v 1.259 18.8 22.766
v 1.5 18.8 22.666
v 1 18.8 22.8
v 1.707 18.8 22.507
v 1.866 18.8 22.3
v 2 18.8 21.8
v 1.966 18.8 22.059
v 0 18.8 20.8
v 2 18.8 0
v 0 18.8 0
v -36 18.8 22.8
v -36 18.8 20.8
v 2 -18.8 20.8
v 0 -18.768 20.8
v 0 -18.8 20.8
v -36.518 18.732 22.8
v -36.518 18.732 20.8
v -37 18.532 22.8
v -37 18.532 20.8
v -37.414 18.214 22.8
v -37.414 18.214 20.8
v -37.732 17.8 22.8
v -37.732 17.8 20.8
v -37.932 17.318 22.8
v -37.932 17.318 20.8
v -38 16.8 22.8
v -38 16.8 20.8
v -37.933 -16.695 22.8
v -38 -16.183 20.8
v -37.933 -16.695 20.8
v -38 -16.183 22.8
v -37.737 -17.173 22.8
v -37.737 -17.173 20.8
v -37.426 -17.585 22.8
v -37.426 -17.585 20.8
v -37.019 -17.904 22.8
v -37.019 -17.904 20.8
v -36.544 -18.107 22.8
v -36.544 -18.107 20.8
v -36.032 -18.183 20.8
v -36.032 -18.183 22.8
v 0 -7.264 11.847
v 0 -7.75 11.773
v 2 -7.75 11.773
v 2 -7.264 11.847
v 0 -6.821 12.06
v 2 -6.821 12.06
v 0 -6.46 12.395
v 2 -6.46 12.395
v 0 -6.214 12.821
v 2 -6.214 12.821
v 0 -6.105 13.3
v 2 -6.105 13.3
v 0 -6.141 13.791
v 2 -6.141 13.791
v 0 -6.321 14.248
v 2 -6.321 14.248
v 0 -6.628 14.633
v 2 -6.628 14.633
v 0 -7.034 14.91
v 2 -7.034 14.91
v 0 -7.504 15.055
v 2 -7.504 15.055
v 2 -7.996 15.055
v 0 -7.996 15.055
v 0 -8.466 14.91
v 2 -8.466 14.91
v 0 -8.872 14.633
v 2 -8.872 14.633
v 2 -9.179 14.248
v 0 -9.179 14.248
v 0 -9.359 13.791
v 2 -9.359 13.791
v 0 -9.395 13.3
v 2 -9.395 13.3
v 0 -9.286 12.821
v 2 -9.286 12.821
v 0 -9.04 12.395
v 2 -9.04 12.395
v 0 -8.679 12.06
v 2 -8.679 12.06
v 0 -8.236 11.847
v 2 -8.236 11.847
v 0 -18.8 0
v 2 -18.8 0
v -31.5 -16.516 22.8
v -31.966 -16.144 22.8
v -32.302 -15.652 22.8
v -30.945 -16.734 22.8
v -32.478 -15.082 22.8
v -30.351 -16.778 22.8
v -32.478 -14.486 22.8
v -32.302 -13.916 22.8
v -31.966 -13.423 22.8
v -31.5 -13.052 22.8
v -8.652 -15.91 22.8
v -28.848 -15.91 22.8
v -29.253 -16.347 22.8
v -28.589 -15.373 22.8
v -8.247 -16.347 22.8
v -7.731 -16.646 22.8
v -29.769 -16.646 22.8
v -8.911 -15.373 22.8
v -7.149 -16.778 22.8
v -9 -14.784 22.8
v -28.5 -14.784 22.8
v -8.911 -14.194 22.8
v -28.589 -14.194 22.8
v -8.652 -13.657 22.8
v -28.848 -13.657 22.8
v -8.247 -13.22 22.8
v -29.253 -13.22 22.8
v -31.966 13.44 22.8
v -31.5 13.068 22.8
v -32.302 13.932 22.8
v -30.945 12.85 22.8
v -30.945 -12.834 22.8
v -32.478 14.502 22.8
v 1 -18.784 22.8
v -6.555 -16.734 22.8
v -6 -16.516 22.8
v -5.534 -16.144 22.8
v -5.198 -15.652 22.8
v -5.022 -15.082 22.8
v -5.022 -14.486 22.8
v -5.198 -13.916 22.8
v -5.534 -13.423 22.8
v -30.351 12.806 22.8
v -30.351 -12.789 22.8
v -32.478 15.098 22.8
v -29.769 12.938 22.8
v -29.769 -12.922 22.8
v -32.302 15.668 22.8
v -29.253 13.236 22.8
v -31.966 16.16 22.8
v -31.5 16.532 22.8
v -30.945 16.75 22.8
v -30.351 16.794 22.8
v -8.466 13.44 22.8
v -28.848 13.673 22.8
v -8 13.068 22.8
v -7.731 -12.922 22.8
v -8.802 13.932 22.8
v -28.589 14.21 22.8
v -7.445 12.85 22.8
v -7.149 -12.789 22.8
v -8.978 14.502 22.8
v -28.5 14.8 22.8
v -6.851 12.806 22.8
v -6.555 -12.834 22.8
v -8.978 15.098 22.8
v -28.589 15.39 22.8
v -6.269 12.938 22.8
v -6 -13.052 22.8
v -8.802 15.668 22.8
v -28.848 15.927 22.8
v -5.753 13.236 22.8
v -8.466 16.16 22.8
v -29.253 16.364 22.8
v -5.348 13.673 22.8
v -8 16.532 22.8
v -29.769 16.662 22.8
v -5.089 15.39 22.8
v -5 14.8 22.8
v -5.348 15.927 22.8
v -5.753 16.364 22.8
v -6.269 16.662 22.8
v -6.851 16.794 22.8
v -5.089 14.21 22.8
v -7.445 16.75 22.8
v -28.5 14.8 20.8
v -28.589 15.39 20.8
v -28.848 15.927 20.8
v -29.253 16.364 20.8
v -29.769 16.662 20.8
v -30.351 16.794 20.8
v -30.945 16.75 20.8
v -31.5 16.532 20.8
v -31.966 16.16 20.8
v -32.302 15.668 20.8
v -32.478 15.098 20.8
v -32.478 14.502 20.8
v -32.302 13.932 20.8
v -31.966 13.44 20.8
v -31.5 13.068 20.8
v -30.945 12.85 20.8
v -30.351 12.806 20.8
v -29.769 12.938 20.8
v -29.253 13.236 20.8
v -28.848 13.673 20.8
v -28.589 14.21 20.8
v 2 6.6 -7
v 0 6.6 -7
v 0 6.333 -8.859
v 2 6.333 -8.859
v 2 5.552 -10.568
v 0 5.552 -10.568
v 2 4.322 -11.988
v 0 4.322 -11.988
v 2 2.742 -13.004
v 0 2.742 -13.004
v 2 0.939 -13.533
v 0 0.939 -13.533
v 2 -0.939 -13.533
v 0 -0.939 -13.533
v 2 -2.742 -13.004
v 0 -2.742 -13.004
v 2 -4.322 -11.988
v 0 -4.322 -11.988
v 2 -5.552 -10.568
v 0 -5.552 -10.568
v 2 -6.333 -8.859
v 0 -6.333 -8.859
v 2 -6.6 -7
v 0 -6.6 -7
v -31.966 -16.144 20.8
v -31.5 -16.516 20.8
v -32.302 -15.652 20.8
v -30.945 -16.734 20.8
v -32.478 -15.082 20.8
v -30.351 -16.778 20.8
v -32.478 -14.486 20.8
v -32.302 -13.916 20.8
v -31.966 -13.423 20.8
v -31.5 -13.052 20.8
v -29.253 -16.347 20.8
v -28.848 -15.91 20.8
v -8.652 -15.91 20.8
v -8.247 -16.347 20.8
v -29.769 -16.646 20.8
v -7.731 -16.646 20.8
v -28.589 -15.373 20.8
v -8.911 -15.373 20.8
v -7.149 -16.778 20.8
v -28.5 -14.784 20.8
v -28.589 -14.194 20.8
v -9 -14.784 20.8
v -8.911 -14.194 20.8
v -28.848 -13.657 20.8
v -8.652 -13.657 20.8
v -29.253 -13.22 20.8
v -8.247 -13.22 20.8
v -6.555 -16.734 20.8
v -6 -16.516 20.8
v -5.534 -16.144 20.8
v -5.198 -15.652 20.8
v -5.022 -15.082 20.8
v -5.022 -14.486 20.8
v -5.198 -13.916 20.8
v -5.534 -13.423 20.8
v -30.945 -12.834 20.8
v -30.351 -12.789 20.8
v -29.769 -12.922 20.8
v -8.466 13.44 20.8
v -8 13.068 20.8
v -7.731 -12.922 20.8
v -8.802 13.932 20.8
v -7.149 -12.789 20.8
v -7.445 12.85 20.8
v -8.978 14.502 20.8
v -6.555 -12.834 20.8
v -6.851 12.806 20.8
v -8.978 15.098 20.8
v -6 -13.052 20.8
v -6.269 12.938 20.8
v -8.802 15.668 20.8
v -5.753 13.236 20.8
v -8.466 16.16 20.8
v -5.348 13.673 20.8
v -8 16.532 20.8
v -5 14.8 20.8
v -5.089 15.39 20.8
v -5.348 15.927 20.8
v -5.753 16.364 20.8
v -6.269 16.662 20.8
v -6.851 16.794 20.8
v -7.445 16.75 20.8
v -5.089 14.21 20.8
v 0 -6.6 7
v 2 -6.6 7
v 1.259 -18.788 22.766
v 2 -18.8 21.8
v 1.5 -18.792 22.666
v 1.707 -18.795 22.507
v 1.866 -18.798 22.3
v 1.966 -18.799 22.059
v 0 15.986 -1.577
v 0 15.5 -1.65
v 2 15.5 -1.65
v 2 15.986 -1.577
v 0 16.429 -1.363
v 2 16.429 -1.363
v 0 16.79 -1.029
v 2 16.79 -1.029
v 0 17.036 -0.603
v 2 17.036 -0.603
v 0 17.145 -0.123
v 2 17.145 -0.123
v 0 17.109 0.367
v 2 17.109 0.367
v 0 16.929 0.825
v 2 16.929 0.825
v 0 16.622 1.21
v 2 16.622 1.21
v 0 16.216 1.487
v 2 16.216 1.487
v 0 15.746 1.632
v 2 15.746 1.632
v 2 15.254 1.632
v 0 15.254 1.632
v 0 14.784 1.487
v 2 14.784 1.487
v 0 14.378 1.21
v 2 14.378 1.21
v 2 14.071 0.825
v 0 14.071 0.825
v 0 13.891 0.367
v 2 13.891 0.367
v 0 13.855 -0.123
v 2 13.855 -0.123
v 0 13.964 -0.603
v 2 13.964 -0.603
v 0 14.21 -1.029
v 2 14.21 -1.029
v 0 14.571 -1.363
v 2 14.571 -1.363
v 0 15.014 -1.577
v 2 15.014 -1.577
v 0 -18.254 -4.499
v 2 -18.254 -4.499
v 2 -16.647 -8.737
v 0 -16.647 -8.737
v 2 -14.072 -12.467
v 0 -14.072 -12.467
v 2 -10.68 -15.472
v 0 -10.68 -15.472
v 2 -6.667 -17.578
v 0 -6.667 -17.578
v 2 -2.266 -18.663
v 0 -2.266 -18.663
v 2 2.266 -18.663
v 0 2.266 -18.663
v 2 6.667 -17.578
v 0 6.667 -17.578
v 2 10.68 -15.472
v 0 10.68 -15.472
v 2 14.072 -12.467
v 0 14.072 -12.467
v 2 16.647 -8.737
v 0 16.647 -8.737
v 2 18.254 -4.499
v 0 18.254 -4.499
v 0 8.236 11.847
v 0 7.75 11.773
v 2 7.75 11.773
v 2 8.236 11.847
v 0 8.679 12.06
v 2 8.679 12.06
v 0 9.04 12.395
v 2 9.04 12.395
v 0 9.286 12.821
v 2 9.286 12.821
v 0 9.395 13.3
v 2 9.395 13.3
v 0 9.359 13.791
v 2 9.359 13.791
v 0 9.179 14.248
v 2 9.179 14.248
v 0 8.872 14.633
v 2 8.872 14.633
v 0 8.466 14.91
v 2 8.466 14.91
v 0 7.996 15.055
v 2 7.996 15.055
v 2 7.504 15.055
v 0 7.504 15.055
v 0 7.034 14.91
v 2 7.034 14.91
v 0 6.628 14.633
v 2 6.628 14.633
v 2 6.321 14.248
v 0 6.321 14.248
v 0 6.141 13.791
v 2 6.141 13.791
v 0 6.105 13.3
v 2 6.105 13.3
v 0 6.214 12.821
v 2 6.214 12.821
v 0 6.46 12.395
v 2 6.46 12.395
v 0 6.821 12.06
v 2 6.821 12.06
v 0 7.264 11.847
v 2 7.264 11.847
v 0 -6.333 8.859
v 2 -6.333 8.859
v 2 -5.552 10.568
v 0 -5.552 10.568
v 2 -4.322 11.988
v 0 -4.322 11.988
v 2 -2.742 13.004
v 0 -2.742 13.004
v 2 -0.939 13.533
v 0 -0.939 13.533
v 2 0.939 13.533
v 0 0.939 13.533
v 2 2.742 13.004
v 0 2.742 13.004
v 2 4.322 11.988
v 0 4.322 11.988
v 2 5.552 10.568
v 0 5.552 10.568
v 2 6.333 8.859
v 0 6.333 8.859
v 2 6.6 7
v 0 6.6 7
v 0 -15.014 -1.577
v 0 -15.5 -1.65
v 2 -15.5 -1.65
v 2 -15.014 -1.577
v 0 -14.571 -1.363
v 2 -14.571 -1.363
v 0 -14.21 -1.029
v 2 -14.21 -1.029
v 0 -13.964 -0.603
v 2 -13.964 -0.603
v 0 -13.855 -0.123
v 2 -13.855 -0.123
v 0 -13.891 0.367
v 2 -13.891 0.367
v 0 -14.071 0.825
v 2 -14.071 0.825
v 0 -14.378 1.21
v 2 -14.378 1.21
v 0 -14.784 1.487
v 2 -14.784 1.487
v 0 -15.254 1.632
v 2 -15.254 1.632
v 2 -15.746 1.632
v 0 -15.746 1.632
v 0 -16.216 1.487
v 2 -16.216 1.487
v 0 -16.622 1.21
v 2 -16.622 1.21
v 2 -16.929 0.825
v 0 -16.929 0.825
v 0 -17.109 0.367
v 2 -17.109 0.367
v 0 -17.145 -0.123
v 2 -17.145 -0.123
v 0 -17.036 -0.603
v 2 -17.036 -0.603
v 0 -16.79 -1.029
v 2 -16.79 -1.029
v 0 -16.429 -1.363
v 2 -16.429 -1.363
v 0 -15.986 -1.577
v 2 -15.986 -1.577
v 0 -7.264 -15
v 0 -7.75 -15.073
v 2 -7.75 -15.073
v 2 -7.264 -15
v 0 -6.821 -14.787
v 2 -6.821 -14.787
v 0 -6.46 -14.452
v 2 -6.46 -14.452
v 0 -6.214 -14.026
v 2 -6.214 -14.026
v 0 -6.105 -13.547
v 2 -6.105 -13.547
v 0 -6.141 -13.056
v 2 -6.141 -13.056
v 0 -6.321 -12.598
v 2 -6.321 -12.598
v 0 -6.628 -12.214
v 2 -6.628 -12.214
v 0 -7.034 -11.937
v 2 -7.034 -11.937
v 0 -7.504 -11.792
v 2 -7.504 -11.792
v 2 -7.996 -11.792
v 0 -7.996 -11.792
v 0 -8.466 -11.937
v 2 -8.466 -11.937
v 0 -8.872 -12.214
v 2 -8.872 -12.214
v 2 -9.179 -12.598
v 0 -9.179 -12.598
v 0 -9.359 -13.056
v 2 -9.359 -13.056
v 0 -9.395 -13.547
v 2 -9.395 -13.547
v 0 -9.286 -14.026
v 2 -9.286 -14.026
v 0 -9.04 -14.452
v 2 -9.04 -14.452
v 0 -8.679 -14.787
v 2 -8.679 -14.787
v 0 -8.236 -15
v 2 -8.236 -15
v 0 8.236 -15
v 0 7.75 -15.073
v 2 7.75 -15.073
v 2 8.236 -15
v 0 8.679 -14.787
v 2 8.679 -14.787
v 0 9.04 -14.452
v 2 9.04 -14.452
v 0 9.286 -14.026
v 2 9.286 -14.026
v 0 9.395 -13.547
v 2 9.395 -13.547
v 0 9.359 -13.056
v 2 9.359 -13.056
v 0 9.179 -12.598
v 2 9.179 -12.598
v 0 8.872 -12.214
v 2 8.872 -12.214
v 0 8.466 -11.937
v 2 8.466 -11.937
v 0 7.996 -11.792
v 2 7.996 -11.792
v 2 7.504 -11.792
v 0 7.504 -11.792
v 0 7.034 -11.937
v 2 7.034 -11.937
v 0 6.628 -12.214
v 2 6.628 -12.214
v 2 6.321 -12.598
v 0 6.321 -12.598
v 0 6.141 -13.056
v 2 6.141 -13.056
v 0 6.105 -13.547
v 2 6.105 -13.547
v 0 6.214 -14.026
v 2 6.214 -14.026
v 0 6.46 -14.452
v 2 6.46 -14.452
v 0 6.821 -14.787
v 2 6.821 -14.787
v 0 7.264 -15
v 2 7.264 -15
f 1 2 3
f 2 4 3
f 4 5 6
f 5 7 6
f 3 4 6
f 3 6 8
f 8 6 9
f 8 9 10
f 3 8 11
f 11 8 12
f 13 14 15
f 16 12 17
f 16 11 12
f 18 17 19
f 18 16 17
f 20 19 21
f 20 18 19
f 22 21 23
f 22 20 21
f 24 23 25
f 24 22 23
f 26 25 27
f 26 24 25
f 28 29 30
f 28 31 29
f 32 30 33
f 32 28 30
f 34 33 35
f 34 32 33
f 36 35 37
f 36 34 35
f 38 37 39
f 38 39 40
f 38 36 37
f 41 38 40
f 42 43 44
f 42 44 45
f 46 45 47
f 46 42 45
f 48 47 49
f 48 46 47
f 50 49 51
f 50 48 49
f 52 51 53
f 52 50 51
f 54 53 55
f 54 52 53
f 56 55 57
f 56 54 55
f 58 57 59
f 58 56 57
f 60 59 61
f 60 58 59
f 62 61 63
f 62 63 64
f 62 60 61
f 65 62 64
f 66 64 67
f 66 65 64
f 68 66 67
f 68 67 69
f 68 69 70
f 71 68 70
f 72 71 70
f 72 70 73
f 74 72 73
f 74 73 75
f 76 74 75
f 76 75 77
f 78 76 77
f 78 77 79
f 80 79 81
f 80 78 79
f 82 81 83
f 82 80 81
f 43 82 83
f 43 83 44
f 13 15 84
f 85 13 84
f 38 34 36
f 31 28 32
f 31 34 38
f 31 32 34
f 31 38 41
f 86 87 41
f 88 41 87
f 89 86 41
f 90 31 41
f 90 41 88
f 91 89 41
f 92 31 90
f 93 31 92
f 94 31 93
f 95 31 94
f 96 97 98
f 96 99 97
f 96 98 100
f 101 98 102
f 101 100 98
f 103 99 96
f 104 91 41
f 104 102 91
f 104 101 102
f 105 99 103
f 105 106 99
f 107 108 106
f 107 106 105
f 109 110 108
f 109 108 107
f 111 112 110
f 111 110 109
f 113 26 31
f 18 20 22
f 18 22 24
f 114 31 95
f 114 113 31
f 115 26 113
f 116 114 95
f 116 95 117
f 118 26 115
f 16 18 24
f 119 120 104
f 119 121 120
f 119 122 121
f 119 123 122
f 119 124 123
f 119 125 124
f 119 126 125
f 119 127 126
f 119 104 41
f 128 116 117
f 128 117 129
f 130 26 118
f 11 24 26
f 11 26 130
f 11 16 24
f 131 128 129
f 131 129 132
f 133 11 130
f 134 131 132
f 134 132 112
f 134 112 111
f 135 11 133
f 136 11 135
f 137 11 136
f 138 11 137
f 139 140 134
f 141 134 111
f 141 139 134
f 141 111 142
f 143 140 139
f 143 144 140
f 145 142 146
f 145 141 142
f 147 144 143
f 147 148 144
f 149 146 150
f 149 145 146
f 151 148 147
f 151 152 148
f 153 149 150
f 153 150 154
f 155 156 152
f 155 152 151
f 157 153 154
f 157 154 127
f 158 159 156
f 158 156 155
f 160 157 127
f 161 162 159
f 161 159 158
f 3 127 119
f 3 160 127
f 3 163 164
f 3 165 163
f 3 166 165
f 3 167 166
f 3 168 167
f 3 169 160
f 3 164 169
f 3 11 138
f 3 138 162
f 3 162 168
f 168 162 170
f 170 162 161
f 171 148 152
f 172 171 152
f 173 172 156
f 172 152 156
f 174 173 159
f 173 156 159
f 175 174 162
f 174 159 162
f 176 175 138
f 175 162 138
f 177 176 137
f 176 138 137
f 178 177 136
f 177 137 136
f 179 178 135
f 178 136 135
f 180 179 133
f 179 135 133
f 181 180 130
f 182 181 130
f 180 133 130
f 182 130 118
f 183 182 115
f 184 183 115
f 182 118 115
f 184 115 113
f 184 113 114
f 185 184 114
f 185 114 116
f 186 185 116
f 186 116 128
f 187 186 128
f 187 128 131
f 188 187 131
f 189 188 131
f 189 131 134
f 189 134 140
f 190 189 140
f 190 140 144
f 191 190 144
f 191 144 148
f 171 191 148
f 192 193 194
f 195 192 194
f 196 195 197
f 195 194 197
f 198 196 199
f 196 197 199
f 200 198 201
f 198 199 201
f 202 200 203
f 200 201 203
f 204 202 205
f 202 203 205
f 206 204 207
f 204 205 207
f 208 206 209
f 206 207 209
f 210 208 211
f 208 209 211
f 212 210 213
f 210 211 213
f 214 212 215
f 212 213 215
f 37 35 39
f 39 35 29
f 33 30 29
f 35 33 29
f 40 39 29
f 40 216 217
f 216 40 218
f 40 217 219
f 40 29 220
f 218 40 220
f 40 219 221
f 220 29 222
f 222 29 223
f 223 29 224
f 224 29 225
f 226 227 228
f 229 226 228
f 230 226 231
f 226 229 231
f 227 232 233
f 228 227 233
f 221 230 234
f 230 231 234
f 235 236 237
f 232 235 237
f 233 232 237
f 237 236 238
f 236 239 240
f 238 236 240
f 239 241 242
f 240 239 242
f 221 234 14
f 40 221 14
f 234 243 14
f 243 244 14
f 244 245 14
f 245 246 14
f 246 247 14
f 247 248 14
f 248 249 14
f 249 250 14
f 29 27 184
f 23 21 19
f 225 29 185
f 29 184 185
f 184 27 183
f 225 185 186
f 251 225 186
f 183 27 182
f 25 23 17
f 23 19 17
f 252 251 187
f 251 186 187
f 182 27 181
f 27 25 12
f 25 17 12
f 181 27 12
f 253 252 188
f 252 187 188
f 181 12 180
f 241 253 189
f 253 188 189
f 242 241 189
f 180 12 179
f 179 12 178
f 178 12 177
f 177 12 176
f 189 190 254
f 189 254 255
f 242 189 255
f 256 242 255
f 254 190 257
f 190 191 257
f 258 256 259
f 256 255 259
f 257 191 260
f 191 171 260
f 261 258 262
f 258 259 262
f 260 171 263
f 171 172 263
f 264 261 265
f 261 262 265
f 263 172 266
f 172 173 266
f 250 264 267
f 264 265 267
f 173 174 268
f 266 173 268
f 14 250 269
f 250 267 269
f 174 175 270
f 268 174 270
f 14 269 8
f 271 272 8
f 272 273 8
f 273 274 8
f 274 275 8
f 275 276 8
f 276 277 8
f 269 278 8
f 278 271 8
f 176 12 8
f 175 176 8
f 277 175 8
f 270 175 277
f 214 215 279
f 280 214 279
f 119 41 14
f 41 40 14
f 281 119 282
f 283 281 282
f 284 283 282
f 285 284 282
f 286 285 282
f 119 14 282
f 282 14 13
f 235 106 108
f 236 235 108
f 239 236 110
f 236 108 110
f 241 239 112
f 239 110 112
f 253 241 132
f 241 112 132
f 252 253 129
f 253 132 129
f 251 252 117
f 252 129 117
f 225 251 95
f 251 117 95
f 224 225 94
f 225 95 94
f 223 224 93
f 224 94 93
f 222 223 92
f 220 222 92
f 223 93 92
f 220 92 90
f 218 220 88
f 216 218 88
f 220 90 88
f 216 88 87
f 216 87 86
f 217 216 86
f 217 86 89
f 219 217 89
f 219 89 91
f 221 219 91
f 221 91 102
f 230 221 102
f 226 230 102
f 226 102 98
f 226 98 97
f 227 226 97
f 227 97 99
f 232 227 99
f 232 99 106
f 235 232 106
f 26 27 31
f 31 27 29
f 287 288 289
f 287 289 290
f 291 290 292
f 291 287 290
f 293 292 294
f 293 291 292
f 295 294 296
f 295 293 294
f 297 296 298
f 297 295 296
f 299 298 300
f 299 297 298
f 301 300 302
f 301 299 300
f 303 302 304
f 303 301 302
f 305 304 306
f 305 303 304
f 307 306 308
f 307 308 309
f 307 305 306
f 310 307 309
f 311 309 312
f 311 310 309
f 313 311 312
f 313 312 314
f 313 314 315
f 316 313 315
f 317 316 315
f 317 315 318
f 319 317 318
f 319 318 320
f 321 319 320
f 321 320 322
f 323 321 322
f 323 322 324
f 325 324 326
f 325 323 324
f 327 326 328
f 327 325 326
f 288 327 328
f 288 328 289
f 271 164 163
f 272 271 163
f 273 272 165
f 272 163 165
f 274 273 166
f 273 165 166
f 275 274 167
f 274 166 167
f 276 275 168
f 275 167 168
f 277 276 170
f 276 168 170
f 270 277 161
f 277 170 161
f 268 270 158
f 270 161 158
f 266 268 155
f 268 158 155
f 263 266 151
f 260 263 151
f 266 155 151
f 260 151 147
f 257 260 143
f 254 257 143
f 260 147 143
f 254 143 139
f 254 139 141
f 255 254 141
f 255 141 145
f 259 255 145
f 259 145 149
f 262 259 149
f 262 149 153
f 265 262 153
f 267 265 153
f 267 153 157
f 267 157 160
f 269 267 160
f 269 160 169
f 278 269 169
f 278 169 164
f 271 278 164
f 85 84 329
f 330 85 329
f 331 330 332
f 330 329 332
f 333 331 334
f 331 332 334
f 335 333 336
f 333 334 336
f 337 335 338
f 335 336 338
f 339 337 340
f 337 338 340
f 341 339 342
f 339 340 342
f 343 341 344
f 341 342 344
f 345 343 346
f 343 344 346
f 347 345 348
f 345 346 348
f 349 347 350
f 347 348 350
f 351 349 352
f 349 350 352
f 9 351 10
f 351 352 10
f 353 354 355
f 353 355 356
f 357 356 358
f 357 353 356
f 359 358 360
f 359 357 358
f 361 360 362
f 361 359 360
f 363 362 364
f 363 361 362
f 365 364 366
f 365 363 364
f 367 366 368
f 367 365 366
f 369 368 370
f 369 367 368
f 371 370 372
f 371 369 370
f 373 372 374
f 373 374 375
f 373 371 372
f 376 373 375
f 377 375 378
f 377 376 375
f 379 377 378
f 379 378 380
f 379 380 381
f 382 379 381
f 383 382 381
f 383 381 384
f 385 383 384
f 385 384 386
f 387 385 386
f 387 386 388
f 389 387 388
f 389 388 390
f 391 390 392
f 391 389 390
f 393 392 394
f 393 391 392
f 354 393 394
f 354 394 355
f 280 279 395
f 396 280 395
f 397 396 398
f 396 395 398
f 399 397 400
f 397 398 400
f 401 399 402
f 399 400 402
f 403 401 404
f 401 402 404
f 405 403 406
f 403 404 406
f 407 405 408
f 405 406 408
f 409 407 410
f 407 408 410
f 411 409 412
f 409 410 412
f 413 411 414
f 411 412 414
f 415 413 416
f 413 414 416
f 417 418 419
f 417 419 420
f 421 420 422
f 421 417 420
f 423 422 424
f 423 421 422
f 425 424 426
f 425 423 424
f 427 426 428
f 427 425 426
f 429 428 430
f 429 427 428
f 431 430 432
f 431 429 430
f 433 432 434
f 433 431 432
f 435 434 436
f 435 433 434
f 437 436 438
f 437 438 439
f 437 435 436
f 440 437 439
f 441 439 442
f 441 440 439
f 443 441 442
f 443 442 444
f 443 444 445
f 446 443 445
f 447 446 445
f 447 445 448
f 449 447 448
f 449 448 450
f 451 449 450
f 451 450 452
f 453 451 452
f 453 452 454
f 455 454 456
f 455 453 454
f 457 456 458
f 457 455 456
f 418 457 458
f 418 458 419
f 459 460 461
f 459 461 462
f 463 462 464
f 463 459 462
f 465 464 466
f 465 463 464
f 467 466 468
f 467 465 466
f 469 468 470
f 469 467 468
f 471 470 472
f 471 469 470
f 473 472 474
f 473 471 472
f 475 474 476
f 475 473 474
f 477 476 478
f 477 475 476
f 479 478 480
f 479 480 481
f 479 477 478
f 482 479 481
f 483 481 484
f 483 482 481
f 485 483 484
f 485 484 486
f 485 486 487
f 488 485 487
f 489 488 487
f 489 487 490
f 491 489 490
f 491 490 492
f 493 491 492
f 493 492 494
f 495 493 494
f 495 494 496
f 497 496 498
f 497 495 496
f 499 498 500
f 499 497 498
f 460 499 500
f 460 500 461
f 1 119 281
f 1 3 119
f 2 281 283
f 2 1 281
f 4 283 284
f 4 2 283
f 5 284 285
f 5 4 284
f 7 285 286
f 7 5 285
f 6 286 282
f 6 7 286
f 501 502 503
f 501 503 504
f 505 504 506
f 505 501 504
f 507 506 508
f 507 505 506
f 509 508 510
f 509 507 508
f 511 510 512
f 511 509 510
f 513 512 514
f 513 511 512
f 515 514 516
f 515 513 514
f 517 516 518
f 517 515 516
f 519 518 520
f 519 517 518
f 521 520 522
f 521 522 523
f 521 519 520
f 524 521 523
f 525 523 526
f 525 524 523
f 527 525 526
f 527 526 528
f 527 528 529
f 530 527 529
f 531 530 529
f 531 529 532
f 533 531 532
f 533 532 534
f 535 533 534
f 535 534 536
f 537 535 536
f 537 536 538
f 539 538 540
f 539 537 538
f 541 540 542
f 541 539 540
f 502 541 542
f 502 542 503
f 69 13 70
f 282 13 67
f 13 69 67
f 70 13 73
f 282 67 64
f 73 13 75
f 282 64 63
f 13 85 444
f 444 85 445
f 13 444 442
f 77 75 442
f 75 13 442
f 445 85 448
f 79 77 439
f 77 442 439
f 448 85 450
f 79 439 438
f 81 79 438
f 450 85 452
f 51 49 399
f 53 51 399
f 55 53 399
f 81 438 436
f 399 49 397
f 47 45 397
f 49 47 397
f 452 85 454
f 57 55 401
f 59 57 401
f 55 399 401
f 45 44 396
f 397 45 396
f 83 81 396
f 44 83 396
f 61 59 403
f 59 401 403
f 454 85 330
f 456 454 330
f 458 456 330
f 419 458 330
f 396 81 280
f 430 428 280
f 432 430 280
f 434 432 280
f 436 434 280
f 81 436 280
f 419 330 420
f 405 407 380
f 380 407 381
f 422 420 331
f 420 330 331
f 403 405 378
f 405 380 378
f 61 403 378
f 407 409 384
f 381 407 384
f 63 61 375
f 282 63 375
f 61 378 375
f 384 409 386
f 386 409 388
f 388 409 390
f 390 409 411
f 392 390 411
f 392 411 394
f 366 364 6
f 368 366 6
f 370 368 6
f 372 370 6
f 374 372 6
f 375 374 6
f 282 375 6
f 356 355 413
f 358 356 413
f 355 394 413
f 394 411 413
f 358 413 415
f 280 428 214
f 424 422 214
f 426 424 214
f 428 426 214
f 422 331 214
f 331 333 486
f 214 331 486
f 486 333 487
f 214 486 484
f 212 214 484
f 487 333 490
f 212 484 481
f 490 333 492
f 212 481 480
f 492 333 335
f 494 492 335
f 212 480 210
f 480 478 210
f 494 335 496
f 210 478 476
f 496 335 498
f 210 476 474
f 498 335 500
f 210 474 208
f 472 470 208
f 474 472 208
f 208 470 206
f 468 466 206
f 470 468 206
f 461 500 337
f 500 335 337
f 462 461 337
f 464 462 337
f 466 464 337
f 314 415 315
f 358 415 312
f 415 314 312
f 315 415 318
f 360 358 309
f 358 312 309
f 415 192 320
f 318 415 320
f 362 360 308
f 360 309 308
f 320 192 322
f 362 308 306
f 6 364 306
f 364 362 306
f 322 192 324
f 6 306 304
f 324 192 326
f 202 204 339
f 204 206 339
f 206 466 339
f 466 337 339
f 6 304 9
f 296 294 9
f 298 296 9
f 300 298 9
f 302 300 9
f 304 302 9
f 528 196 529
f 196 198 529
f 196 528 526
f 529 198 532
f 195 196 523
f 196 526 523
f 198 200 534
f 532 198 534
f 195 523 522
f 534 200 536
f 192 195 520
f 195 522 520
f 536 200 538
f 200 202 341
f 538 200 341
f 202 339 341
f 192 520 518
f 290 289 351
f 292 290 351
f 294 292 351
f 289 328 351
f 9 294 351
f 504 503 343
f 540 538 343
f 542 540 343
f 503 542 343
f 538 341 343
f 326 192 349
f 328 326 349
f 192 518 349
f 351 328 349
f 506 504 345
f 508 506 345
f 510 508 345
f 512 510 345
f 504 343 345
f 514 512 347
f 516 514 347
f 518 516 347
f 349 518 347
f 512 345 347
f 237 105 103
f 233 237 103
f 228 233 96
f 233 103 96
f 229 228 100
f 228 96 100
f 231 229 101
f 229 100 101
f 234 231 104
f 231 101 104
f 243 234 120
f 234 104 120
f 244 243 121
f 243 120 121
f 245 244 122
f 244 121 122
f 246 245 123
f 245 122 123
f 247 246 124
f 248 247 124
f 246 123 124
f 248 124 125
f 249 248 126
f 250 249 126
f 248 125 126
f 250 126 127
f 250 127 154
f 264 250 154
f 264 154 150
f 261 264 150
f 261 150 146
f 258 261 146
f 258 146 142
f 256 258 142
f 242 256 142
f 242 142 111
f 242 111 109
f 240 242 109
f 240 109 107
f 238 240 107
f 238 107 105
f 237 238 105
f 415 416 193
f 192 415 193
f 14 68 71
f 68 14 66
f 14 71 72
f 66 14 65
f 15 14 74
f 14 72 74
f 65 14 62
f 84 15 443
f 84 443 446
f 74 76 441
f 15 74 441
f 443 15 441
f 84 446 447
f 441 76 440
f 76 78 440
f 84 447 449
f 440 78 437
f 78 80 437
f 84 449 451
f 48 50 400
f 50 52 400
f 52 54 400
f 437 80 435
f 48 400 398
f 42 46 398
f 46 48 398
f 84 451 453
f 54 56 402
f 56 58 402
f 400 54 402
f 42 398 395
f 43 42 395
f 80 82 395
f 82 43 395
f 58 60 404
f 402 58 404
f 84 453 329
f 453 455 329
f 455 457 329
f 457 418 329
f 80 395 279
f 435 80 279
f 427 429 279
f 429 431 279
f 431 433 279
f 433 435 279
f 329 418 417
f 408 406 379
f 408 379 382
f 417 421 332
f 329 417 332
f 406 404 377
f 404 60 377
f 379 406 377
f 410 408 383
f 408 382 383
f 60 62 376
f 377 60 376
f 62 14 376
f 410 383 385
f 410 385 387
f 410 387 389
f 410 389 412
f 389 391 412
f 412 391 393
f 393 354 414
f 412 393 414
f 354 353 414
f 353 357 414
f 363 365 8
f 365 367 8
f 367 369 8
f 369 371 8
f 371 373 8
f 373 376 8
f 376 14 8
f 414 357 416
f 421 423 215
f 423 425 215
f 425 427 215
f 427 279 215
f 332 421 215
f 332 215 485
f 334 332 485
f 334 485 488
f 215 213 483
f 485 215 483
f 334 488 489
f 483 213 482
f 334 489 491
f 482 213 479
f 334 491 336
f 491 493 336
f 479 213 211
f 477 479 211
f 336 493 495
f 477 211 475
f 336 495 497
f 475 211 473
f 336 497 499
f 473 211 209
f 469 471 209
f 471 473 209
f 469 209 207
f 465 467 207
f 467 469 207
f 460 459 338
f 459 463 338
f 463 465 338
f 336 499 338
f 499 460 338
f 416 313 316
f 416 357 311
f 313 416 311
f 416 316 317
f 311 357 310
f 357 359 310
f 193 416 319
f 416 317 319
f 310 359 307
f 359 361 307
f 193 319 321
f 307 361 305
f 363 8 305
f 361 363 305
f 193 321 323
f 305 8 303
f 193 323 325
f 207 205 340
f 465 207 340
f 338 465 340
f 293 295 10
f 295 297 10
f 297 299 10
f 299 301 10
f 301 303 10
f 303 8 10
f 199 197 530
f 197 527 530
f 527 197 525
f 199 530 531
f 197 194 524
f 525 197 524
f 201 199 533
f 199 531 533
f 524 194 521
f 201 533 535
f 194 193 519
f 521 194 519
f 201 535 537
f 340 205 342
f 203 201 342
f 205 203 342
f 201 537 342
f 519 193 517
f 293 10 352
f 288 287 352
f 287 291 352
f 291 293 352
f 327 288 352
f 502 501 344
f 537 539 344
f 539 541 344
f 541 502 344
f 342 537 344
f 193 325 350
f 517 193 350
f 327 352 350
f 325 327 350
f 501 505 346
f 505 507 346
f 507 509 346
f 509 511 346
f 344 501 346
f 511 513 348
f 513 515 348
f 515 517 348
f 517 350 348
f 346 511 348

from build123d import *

# Parameters (mm, degrees)
CROQUIS1_R              = 1.65
SALIENTE_EXTRUIR1_DEPTH = 2
SALIENTE_EXTRUIR2_DEPTH = 2
REDONDEO1_R             = 1
REDONDEO2_R             = 2
CROQUIS3_R              = 2
CORTAR_EXTRUIR1_DEPTH   = 60.39696962


with BuildPart() as part:
    # Croquis1 → Saliente-Extruir1 (new body)
    with BuildSketch(Plane(origin=(0, 0, 0), x_dir=(0, 0, -1), z_dir=(1, 0, 0))):
        with BuildLine():
            Line((0, 18.8), (-20.8, 18.8))
            Line((-20.8, 18.8), (-20.8, -18.8))
            Line((-20.8, -18.8), (0, -18.8))
            ThreePointArc((0, -18.8), (18.8, 0), (0, 18.8))
        make_face()
        with Locations((13.423393759, 7.75)):
            Circle(CROQUIS1_R, mode=Mode.SUBTRACT)
        with Locations((13.423393759, -7.75)):
            Circle(CROQUIS1_R, mode=Mode.SUBTRACT)
        with Locations((0, -15.5)):
            Circle(CROQUIS1_R, mode=Mode.SUBTRACT)
        with Locations((-13.423393759, -7.75)):
            Circle(CROQUIS1_R, mode=Mode.SUBTRACT)
        with Locations((-13.423393759, 7.75)):
            Circle(CROQUIS1_R, mode=Mode.SUBTRACT)
        with Locations((0, 15.5)):
            Circle(CROQUIS1_R, mode=Mode.SUBTRACT)
        with BuildLine():
            Line((-7, 6.6), (7, 6.6))
            ThreePointArc((7, 6.6), (13.6, 0), (7, -6.6))
            Line((7, -6.6), (-7, -6.6))
            ThreePointArc((-7, -6.6), (-13.6, 0), (-7, 6.6))
        make_face(mode=Mode.SUBTRACT)
    extrude(amount=SALIENTE_EXTRUIR1_DEPTH)

    # Croquis2 → Saliente-Extruir2 (add)
    with BuildSketch(Plane.XY.offset(20.8)):
        Polygon((2, 18.8), (-38, 18.8), (-38, -18.150603338), (2, -18.8), align=None)
    extrude(amount=SALIENTE_EXTRUIR2_DEPTH)

    # Redondeo1
    redondeo1_edges = [part.edges().sort_by_distance(p)[0] for p in [
        (2, 0, 22.8),
    ]]
    fillet(redondeo1_edges, radius=REDONDEO1_R)

    # Redondeo2
    redondeo2_edges = [part.edges().sort_by_distance(p)[0] for p in [
        (-38, 18.8, 21.8),
        (-38, -18.150603338, 21.8),
    ]]
    fillet(redondeo2_edges, radius=REDONDEO2_R)

    # Croquis3 → Cortar-Extruir1 (cut, through all)
    with BuildSketch(Plane.XY.offset(22.8)):
        with Locations((-7, 14.8)):
            Circle(CROQUIS3_R)
        with Locations(Location((-7, -14.783765083, 0), (0, 0, 180))):
            Circle(CROQUIS3_R)
        with Locations((-30.5, 14.8)):
            Circle(CROQUIS3_R)
        with Locations((-30.5, -14.783765083)):
            Circle(CROQUIS3_R)
    extrude(amount=-CORTAR_EXTRUIR1_DEPTH, mode=Mode.SUBTRACT)


solid = part.part
